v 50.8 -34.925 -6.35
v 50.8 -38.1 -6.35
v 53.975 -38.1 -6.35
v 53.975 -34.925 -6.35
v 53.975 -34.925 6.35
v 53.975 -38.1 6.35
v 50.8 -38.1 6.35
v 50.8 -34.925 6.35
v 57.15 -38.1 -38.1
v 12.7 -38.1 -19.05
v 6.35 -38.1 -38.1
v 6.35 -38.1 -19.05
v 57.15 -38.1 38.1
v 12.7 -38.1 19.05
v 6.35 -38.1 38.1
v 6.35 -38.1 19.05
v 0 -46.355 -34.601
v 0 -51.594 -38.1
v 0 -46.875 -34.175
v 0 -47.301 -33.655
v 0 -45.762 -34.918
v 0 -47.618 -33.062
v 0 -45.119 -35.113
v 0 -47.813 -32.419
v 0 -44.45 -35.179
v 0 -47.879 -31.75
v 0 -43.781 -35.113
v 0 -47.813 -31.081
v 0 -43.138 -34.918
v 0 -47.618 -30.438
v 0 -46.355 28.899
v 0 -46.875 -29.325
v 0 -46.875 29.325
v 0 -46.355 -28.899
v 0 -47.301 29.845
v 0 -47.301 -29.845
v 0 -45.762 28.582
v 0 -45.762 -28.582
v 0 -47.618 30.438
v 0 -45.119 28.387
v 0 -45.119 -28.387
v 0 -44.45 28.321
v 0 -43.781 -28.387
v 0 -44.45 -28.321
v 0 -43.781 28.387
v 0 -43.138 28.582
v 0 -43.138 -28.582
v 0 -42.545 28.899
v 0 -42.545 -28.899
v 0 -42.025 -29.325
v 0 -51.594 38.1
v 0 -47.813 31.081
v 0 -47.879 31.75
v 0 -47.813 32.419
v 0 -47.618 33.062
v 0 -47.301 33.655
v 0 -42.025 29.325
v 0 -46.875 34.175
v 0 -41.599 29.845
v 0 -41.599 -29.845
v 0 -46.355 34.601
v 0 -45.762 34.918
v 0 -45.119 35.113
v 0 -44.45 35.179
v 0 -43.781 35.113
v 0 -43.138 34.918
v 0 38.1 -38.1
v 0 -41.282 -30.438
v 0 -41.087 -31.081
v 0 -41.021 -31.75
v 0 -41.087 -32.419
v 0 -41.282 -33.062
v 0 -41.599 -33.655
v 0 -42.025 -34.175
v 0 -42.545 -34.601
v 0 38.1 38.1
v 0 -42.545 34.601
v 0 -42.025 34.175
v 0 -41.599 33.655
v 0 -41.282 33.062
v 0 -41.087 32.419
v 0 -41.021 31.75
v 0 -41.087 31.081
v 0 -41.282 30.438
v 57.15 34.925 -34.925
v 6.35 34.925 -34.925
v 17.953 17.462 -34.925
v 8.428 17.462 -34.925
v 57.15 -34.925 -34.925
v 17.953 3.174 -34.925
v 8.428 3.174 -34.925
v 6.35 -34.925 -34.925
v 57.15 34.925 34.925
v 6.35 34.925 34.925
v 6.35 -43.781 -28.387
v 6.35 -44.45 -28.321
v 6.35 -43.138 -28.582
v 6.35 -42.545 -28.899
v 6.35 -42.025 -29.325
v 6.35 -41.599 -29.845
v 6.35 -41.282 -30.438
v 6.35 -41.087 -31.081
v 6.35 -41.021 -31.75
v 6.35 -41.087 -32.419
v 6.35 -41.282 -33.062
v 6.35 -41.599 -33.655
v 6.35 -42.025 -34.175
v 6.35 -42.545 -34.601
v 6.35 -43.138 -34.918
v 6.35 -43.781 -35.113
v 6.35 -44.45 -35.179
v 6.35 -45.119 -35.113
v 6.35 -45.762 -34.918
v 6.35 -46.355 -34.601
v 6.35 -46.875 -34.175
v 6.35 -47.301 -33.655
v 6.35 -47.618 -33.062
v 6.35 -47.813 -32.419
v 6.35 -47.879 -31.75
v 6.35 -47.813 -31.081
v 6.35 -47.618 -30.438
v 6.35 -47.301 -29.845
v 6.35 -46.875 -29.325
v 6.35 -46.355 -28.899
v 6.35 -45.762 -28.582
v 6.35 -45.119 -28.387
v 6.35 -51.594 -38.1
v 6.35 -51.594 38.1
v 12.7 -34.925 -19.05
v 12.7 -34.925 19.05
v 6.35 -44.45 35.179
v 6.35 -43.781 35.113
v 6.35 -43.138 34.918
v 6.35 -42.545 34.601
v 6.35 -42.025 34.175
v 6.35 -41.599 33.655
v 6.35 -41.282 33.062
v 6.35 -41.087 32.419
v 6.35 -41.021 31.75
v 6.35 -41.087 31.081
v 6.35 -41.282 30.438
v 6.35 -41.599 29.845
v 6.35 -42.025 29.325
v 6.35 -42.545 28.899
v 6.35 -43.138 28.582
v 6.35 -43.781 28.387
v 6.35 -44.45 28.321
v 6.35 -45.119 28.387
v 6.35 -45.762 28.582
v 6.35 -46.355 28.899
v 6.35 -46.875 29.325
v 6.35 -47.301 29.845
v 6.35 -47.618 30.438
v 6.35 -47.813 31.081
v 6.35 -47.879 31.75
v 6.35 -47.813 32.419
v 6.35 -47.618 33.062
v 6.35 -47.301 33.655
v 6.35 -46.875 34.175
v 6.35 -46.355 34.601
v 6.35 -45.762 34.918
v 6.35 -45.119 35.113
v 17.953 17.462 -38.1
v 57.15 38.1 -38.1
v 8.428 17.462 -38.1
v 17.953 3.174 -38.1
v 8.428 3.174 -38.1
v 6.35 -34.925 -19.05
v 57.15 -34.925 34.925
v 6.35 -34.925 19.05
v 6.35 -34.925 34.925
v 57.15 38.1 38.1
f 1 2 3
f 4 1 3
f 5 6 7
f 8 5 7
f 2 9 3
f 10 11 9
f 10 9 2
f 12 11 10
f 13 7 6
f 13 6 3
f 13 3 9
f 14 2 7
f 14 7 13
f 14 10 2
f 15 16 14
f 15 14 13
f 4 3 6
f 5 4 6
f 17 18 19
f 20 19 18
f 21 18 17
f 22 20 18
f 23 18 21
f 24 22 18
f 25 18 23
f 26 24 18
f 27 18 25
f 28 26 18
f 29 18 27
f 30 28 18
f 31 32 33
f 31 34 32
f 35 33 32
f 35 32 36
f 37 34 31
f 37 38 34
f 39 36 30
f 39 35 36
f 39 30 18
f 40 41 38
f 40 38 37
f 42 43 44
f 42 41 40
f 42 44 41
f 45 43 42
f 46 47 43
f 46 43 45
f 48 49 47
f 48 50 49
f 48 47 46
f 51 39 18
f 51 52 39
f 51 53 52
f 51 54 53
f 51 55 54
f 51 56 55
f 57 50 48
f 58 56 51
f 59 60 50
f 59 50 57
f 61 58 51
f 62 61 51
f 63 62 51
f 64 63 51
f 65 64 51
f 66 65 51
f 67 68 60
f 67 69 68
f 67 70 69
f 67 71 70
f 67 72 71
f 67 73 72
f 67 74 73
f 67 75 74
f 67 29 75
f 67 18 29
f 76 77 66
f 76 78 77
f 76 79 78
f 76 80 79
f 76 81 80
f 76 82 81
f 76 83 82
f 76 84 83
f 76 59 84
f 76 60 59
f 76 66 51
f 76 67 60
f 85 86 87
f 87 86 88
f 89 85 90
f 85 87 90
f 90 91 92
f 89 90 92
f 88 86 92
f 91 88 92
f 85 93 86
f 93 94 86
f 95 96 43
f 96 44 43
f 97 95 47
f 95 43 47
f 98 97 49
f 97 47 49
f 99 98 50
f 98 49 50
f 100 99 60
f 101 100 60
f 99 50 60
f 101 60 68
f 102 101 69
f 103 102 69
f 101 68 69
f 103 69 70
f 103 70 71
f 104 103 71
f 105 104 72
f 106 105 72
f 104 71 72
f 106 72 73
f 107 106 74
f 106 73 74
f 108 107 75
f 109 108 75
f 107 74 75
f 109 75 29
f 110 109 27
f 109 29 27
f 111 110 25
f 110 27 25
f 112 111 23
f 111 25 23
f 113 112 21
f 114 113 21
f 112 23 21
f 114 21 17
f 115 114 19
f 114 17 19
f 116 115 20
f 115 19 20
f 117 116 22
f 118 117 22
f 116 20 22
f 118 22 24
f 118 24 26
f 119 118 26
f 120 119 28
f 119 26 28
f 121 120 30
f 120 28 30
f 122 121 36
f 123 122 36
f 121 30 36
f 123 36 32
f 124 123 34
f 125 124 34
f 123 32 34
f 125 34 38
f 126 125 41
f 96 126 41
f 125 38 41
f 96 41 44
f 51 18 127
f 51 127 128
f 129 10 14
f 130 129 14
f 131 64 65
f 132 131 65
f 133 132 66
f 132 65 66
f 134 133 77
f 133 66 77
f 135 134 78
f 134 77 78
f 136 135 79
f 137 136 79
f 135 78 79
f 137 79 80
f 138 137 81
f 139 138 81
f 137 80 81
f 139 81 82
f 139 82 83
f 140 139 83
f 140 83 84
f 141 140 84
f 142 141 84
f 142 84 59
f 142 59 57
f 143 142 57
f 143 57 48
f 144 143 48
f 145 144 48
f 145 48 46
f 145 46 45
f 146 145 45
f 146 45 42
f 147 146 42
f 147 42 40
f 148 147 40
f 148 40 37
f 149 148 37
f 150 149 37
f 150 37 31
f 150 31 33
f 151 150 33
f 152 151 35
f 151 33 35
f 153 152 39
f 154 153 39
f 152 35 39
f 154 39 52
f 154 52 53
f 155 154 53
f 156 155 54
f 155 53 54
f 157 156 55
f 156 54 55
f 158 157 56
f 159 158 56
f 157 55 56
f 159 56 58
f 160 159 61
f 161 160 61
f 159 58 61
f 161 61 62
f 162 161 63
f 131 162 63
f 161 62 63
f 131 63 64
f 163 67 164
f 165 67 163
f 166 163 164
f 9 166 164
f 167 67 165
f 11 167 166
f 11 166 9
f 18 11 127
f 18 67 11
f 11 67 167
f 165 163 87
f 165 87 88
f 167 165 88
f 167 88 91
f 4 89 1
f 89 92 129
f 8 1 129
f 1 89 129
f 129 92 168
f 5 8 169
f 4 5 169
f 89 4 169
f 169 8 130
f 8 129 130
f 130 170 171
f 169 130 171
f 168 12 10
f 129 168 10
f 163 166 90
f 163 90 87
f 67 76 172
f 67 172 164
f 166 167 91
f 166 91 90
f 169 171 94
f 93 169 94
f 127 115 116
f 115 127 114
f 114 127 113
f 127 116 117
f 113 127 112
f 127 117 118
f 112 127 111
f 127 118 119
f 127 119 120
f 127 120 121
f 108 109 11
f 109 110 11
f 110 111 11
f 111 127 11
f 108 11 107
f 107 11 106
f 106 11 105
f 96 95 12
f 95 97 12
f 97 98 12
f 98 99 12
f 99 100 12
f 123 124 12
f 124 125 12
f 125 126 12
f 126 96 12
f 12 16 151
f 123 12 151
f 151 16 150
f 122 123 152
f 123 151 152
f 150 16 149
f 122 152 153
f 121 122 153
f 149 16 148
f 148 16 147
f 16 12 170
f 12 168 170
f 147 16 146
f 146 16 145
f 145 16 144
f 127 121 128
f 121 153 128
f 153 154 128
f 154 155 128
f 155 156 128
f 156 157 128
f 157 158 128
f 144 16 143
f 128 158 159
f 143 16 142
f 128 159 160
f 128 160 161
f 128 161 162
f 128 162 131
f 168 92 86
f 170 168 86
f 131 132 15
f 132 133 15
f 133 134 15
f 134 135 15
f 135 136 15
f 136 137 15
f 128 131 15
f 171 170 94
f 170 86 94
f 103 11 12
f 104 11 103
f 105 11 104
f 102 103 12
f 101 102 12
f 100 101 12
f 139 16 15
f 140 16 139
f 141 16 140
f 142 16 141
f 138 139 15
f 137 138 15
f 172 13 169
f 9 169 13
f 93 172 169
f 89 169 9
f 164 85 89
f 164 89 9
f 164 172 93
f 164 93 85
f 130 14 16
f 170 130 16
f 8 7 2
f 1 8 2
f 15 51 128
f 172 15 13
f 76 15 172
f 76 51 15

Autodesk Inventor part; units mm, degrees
ref_plane "YZ Plane" through (0, 0, 0) normal (1, 0, 0) x (0, 1, 0)
ref_plane "XZ Plane" through (0, 0, 0) normal (0, 1, 0) x (-1, 0, 0)
ref_plane "XY Plane" through (0, 0, 0) normal (0, 0, 1) x (1, 0, 0)
sketch "Sketch1" plane through (0, 0, 0) normal (1, 0, 0) x (0, 1, 0)
  line L0 (-38.1, 38.1) -> (38.1, 38.1)
  line L1 (38.1, 38.1) -> (38.1, -38.1)
  line L2 (38.1, -38.1) -> (-38.1, -38.1)
  line L3 (-38.1, -38.1) -> (-38.1, 38.1)
  line L4 (-38.1, 38.1) -> (0, 38.1)
  line L5 (-38.1, 34.925) -> (-38.1, 38.1)
  point P0 (0, 0)
  dimension "d0" = 76.2
  dimension "d1" = 76.2
  dimension "d2" = 38.1
  dimension "d3" = 38.1
extrude "Extrusion1" add sketch "Sketch1" along normal blind 6.35
sketch "Sketch2" plane through (6.35, 0, 0) normal (1, 0, 0) x (0, 0, -1)
  line L0 (-34.925, 34.925) -> (34.925, 34.925)
  line L1 (34.925, 34.925) -> (34.925, -34.925)
  line L2 (34.925, -34.925) -> (-34.925, -34.925)
  line L3 (-34.925, -34.925) -> (-34.925, 34.925)
  line L4 (38.1, 38.1) -> (-38.1, 38.1) projected
  line L5 (38.1, -38.1) -> (38.1, 38.1) projected
  line L6 (-38.1, 38.1) -> (-38.1, -38.1) projected
  line L7 (-38.1, -38.1) -> (38.1, -38.1) projected
  point P0 (0, 0)
  dimension "d6" = 3.175
  dimension "d7" = 3.175
  dimension "d8" = 3.175
  dimension "d9" = 3.175
extrude "Extrusion2" add sketch "Sketch2" along normal blind 50.8
sketch "Sketch4" plane through (0, -38.1, -38.1) normal (0, 0, -1) x (-1, 0, 0)
  line L0 (0, 0) -> (0, 76.2) projected
  line L1 (0, 76.2) -> (-57.15, 76.2) projected
  line L2 (-57.15, 0) -> (-57.15, 76.2) projected
  line L3 (0, 0) -> (-57.15, 0) projected
  line L4 (-6.35, 3.175) -> (-6.35, 73.025) projected
  line L5 (-8.4284, 41.2742) -> (-17.9534, 41.2742)
  line L6 (-17.9534, 41.2742) -> (-17.9534, 55.5617)
  line L7 (-17.9534, 55.5617) -> (-8.4284, 55.5617)
  line L8 (-8.4284, 55.5617) -> (-8.4284, 41.2742)
  point P0 (0, 38.1)
  dimension "d14" = 14.2875
  dimension "d15" = 9.525
extrude "Extrusion4" cut sketch "Sketch4" against normal blind 6.35 contours L5 L6 L7 L8
sketch "Sketch5" plane through (0, 0, 0) normal (-1, 0, 0) x (0, 0, 1)
  line L0 (-38.1, 38.1) -> (38.1, 38.1) projected
  line L1 (-38.1, -38.1) -> (-38.1, 38.1) projected
  line L2 (38.1, -38.1) -> (-38.1, -38.1) projected
  line L3 (38.1, 38.1) -> (38.1, -38.1) projected
  line L4 (38.1, -38.1) -> (-38.1, -38.1) projected
  line L5 (38.1, -38.1) -> (-38.1, -38.1)
  line L6 (-38.1, -38.1) -> (-38.1, -51.5938)
  line L7 (-38.1, -51.5938) -> (38.1, -51.5938)
  line L8 (38.1, -51.5938) -> (38.1, -38.1)
  circle A0 centre (31.75, -44.45) radius 3.429
  circle A1 centre (-31.75, -44.45) radius 3.429
  point P0 (0, 0)
  point P1 (0, -51.5938)
  dimension "d18" = 6.858
  dimension "d19" = 6.858
  dimension "d20" = 63.5
  dimension "d22" = 7.1437
  dimension "d23" = 7.1437
  dimension "d36" = 6.35
  dimension "d37" = 76.2
  dimension "d38" = 31.75
extrude "Extrusion5" add sketch "Sketch5" against normal blind 6.35 contours L2 L8 L7 L6
sketch "Sketch6" plane through (57.15, -38.1, -38.1) normal (0, -1, 0) x (1, 0, 0)
  line L0 (-50.8, 76.2) -> (-50.8, 0) projected
  line L1 (-50.8, 0) -> (0, 0) projected
  line L2 (0, 76.2) -> (0, 0) projected
  line L3 (-50.8, 76.2) -> (0, 76.2) projected
  line L4 (-57.15, 0) -> (-57.15, 76.2) projected
  line L5 (-57.15, 0) -> (-50.8, 0) projected
  line L6 (-50.8, 76.2) -> (-50.8, 0) projected
  line L7 (-57.15, 76.2) -> (-50.8, 76.2) projected
  line L8 (-50.8, 73.025) -> (-50.8, 3.175) projected
  line L9 (-50.8, 19.05) -> (-44.45, 19.05)
  line L10 (-44.45, 19.05) -> (-44.45, 57.15)
  line L11 (-44.45, 57.15) -> (-50.8, 57.15)
  line L12 (-50.8, 57.15) -> (-50.8, 19.05)
  line L13 (-6.35, 31.75) -> (-3.175, 31.75)
  line L14 (-3.175, 31.75) -> (-3.175, 44.45)
  line L15 (-3.175, 44.45) -> (-6.35, 44.45)
  line L16 (-6.35, 44.45) -> (-6.35, 31.75)
  point P0 (-57.15, 38.1)
  point P1 (-50.8, 38.1)
  point P2 (0, 38.1)
  dimension "d26" = 38.1
  dimension "d27" = 76.2
  dimension "d28" = 38.1
  dimension "d29" = 6.35
  dimension "d32" = 12.7
  dimension "d33" = 3.175
  dimension "d34" = 6.35
  dimension "d35" = 3.175
extrude "Extrusion6" cut sketch "Sketch6" against normal blind 14.2875 contours L11 L10 L9 L0 | L16 L15 L14 L13
equation "\"d2\" = 0.5 * d1"
equation "\"d3\" = 0.5 * d0"
equation "\"d7\" = d6"
equation "\"d8\" = d6"
equation "\"d9\" = d6"
equation "\"d19\" = d18"
equation "\"d22\" = d23"
equation "\"d38\" = 0.5 * d20"
equation "\"d28\" = 0.5 * d27"
equation "\"d34\" = 0.5 * d32"
properties part number "Part_1_box"
